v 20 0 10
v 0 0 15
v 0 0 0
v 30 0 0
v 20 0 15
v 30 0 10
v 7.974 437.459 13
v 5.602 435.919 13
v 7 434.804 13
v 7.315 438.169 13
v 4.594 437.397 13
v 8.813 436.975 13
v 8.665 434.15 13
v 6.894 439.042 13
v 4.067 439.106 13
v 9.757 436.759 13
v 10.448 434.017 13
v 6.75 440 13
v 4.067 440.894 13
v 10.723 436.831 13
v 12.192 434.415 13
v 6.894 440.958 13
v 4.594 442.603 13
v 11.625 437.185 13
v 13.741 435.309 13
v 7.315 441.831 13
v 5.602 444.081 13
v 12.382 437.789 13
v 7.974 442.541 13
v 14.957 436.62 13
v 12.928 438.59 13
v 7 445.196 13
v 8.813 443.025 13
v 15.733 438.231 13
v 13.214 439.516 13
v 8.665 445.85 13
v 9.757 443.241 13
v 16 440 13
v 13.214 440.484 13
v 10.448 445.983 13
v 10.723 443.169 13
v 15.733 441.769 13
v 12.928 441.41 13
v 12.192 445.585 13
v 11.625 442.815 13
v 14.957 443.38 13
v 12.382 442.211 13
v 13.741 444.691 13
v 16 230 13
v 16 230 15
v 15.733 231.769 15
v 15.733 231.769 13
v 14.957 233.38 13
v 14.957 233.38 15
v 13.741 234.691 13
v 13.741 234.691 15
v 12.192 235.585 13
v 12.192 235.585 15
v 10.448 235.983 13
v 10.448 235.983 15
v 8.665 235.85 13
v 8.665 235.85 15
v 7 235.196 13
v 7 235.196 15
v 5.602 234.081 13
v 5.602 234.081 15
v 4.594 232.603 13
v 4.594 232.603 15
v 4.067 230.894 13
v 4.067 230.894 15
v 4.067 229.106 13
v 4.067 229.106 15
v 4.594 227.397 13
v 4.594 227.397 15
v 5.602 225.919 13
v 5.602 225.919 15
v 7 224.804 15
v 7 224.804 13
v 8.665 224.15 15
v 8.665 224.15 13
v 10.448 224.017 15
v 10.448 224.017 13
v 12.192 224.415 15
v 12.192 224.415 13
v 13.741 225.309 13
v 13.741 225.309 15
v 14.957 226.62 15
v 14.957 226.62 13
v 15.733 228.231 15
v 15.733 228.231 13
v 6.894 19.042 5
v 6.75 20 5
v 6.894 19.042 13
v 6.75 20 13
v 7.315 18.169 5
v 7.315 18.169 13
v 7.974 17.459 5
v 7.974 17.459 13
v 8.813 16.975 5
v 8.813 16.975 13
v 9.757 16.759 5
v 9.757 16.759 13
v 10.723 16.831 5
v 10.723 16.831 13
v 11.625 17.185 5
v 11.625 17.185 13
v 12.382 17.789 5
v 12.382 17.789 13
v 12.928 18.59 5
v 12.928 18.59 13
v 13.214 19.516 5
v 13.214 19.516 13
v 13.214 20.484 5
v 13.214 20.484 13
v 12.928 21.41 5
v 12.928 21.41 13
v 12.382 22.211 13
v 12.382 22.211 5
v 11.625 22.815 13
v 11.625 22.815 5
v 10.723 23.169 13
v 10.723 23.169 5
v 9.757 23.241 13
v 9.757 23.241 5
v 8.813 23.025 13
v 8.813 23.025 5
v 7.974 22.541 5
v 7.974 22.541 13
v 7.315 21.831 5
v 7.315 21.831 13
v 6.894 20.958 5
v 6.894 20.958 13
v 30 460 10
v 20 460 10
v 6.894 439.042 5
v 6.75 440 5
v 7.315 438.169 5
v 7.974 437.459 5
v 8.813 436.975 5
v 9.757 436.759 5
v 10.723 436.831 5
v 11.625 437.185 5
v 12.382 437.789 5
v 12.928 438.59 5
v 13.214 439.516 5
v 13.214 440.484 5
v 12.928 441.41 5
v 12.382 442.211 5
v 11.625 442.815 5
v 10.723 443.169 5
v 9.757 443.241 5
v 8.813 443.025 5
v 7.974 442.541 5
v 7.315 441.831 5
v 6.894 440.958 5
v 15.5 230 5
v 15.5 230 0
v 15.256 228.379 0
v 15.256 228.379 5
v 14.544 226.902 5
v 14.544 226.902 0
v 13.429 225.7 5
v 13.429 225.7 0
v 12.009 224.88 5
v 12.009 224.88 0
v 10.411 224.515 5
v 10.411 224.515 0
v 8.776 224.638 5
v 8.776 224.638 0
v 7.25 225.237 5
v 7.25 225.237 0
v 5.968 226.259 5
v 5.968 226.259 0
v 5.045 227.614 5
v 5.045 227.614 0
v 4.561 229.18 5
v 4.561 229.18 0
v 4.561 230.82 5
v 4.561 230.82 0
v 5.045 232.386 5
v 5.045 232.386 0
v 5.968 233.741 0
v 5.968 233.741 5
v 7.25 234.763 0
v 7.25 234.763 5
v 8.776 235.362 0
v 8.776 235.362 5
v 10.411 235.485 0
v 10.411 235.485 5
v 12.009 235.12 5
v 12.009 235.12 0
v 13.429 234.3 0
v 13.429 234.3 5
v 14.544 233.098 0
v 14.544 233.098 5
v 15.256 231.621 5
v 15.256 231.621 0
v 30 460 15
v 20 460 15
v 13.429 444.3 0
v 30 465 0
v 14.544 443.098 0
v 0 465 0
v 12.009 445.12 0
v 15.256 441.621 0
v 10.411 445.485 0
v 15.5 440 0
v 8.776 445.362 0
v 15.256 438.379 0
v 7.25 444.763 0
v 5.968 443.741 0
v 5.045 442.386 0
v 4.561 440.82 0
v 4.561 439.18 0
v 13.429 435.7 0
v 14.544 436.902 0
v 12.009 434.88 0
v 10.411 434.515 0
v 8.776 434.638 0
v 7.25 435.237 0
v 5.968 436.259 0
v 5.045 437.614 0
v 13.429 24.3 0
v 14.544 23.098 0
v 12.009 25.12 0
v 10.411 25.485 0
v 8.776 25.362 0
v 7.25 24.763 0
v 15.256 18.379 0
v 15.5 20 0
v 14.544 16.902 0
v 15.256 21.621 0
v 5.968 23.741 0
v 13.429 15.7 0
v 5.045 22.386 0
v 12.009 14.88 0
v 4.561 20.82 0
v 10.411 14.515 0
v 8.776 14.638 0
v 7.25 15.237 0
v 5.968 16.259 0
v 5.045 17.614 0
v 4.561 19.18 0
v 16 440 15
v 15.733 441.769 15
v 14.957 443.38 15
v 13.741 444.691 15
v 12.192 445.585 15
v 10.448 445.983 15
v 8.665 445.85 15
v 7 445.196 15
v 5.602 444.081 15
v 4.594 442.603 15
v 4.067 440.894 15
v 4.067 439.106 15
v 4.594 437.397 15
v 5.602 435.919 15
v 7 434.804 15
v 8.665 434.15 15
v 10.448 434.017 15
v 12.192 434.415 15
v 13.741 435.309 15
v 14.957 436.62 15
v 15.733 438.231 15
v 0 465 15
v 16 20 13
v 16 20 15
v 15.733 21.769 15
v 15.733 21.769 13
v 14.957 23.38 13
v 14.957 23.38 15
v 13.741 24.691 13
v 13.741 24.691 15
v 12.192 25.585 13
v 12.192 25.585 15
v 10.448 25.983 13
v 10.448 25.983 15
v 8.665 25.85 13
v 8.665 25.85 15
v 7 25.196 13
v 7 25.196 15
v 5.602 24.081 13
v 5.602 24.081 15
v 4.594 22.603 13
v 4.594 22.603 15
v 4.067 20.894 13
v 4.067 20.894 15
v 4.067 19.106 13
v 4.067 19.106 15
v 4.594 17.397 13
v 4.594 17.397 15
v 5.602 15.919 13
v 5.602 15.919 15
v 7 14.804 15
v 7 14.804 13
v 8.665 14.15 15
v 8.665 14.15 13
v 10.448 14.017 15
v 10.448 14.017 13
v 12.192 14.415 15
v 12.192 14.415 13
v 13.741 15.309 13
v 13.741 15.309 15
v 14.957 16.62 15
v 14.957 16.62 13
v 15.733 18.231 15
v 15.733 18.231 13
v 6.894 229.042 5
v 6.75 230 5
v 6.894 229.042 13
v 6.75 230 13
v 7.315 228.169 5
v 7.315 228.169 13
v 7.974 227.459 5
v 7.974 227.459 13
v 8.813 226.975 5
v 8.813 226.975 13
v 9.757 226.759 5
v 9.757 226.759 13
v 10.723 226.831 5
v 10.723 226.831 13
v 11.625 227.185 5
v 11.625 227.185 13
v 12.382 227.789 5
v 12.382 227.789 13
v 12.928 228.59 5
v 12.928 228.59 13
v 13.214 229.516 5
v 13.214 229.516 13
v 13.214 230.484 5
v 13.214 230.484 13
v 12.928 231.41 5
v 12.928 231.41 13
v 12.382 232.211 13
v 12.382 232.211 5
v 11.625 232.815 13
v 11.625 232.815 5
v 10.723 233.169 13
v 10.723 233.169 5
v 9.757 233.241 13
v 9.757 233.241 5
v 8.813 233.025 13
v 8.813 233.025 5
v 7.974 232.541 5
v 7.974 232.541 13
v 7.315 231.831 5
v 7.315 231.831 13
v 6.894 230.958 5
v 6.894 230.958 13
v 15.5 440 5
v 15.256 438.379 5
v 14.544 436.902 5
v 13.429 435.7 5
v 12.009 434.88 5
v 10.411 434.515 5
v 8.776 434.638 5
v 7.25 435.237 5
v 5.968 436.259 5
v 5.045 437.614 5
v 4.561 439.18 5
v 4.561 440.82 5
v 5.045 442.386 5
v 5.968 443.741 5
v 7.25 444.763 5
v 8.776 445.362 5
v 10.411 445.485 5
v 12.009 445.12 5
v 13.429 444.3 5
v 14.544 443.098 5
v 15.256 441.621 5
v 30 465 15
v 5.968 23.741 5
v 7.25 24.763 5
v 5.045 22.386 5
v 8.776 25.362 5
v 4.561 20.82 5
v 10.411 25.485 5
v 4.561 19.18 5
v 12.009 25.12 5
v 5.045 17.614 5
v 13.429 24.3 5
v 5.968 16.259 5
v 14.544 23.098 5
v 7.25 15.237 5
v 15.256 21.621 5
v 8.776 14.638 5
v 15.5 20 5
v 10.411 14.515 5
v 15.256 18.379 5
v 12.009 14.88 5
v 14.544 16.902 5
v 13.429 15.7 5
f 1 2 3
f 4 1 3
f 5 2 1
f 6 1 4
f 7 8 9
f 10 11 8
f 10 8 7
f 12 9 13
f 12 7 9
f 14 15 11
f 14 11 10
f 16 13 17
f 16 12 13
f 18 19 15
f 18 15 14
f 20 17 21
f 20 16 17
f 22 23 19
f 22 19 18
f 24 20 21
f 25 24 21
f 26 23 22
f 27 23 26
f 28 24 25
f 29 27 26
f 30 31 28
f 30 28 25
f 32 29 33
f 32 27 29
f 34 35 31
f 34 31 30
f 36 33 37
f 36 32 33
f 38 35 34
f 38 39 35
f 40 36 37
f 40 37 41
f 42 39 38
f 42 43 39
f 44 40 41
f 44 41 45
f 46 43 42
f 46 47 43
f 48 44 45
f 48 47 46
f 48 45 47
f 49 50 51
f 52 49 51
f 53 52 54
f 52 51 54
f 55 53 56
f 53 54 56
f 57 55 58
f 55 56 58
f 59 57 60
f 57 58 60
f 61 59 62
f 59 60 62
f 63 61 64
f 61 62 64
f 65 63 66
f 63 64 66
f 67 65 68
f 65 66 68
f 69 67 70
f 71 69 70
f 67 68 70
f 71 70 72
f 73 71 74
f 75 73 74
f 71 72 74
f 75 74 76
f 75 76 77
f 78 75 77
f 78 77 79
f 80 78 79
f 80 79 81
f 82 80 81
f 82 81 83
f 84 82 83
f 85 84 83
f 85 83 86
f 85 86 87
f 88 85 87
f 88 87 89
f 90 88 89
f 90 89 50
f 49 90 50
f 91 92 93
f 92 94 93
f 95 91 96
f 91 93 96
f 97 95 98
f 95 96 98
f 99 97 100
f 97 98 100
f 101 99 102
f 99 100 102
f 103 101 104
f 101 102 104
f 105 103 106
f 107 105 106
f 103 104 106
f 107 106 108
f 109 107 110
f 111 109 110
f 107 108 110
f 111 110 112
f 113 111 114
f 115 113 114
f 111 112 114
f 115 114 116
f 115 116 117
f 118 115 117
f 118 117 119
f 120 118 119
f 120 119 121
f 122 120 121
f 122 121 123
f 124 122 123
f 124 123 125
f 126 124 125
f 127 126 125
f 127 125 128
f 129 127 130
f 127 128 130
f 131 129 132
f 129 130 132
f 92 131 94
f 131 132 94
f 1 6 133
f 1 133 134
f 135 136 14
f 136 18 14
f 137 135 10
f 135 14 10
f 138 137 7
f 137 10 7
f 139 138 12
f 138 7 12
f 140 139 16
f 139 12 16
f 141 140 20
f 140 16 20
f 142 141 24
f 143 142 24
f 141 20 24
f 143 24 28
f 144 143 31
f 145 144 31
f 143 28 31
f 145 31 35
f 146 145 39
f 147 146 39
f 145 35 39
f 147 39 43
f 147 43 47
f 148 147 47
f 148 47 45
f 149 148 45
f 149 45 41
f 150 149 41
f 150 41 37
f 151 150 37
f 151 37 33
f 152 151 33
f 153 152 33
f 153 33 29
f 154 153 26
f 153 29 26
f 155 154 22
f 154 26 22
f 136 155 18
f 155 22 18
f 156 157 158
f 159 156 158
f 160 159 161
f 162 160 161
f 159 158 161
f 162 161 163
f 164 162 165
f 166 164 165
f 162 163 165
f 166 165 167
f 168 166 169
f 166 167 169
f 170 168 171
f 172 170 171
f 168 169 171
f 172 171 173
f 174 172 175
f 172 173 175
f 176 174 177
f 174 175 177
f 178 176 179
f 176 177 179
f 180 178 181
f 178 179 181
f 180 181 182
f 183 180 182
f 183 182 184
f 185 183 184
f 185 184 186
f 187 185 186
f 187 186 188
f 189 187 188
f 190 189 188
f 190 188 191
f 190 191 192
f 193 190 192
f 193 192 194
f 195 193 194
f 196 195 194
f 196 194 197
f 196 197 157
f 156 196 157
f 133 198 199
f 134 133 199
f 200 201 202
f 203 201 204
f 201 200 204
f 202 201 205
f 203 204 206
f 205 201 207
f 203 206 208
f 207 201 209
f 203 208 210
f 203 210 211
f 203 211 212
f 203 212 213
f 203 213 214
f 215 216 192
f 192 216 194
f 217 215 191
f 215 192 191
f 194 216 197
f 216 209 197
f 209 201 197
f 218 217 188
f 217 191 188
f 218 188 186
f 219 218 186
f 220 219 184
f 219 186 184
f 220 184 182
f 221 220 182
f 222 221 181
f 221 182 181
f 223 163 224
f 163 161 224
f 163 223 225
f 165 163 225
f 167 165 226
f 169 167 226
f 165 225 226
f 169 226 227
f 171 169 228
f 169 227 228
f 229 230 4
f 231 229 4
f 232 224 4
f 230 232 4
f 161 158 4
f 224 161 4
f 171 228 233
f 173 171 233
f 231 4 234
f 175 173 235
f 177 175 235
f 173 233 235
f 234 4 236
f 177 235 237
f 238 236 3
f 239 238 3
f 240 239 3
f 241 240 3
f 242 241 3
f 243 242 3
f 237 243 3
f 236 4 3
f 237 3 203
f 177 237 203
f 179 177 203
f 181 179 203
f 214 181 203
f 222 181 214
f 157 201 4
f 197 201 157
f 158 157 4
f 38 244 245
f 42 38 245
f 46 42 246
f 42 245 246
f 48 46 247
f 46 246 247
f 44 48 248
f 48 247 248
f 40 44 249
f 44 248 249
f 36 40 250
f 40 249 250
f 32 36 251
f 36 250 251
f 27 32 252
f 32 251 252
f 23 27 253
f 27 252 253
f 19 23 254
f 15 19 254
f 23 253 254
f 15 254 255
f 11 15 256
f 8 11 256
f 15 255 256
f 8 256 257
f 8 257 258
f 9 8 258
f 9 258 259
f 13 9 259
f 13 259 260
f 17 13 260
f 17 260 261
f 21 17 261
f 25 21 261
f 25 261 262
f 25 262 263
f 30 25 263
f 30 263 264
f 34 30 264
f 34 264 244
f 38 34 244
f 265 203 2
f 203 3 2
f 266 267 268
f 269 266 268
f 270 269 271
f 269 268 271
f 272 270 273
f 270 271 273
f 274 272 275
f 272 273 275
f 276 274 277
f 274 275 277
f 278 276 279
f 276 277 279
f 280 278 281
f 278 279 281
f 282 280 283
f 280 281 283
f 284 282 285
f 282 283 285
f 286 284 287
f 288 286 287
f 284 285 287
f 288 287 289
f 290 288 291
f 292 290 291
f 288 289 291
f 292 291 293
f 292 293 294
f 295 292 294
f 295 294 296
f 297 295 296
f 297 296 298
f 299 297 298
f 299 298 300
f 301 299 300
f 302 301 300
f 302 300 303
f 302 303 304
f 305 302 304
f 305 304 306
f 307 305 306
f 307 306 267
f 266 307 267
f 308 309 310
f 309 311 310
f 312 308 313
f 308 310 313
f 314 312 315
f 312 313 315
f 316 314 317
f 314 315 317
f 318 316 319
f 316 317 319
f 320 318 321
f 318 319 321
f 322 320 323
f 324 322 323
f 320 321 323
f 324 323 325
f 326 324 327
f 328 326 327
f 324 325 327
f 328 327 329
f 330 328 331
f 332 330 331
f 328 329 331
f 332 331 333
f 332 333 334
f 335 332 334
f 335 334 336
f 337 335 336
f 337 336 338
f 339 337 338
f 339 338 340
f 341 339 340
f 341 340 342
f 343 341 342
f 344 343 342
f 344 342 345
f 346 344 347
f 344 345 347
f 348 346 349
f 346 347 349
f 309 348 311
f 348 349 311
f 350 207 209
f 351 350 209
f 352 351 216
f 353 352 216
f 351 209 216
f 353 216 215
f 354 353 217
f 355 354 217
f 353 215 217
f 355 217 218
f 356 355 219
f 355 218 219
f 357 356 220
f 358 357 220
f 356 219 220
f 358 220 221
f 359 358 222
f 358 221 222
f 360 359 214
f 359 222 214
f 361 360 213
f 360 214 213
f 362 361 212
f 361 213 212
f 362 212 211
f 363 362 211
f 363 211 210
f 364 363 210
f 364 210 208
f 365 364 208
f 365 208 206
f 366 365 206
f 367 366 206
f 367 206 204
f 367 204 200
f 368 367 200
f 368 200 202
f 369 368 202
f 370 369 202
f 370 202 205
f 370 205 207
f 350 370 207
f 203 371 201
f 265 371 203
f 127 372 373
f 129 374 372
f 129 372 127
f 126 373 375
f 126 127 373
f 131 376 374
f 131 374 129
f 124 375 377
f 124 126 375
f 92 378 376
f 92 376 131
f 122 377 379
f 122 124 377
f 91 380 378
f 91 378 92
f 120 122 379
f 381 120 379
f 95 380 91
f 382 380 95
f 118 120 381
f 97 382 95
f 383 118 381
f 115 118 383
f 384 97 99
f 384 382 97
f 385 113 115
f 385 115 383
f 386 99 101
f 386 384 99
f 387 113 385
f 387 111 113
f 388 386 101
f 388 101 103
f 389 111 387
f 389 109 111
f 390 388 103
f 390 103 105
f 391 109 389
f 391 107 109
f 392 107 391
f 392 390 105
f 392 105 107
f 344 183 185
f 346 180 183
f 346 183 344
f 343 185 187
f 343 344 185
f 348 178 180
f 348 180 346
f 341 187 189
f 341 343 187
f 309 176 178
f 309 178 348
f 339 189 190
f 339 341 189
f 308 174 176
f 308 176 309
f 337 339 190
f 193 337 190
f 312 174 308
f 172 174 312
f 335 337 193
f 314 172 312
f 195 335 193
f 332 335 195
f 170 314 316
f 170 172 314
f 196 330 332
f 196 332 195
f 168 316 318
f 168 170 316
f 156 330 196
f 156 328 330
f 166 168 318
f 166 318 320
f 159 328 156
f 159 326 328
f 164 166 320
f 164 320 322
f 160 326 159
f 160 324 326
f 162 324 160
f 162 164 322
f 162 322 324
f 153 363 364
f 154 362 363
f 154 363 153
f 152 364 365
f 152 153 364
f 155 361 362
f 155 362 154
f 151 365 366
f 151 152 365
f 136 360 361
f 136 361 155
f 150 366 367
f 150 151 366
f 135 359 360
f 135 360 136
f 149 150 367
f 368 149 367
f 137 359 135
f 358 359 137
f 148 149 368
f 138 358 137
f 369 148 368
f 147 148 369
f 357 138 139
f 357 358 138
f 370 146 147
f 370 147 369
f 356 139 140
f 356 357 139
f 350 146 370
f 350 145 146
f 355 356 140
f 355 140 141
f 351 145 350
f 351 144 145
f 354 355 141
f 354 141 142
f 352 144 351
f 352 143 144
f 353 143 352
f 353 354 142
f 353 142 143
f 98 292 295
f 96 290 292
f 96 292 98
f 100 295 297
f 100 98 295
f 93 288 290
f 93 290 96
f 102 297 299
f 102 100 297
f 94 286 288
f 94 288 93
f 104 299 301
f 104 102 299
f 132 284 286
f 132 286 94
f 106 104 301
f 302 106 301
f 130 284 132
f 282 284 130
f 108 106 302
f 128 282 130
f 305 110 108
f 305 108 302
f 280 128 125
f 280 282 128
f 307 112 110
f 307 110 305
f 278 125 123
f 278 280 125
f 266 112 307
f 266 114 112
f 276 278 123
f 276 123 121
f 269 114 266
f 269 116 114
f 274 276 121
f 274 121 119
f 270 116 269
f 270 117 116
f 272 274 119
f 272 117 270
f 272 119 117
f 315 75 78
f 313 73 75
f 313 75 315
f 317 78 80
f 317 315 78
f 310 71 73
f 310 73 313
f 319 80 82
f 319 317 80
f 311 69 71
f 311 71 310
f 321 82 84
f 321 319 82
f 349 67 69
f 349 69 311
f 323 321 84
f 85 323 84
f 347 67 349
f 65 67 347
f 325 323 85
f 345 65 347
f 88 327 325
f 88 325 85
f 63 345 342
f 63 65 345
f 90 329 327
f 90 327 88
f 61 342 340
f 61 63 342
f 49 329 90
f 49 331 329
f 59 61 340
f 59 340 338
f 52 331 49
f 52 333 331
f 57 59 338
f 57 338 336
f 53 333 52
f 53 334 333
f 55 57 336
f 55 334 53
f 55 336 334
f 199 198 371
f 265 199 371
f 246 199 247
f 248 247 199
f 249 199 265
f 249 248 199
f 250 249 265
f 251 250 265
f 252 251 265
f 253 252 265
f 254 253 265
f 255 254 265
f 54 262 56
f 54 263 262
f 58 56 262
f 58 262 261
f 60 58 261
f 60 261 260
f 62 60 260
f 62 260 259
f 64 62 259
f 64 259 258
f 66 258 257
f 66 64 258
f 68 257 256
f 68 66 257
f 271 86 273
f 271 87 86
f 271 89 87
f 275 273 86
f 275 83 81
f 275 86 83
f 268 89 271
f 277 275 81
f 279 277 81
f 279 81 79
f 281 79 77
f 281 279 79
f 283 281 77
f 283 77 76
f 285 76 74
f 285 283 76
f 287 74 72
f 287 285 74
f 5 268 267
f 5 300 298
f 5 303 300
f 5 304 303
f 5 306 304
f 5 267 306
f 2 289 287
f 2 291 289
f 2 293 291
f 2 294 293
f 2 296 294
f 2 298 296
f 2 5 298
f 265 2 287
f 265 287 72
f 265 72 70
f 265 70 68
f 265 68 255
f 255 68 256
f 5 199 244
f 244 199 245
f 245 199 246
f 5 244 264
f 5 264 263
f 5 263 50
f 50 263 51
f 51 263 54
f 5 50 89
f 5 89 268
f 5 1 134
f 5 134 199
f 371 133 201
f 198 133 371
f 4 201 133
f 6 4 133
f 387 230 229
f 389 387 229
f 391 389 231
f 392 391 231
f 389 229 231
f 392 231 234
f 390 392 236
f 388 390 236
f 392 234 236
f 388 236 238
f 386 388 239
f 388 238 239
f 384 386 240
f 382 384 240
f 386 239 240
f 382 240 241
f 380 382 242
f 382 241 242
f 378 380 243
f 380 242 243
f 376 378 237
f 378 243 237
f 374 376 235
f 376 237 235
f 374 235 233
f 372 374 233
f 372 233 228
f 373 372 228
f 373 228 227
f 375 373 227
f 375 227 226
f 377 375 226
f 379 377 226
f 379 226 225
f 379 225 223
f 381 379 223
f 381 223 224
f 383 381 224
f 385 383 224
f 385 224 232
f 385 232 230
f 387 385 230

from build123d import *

# Parameters (mm, degrees)
F1_DEPTH       = 460
F3_D           = 6.5
F3_DEPTH       = 15
F3_CBORE_D     = 11
F3_CBORE_DEPTH = 5
F5_D           = 6.5
F5_DEPTH       = 15
F5_CBORE_D     = 12
F5_CBORE_DEPTH = 2
F6_W           = 30
F6_H           = 15
F7_DEPTH       = 5


with BuildPart() as f1:
    # F0 (on Front) → F1 (new body)
    with BuildSketch(Plane.XZ):
        Polygon((0, 15), (0, 0), (30, 0), (30, 10), (20, 10), (20, 15), align=None)
    extrude(amount=-F1_DEPTH)

    # F3
    with Locations(Plane(origin=(0, 0, 0), x_dir=(1, 0, 0), z_dir=(0, 0, -1))):
        with Locations((10, -440), (10, -230), (10, -20)):
            CounterBoreHole(F3_D / 2, F3_CBORE_D / 2, F3_CBORE_DEPTH, depth=F3_DEPTH)

    # F5
    with Locations(Plane.XY.offset(15)):
        with Locations((10, 440), (10, 230), (10, 20)):
            CounterBoreHole(F5_D / 2, F5_CBORE_D / 2, F5_CBORE_DEPTH, depth=F5_DEPTH)

    # F6 (on face) → F7 (join)
    with BuildSketch(Plane(origin=(0, 460, 0), x_dir=(-1, 0, 0), z_dir=(0, 1, 0))):
        with Locations((-15, 7.5)):
            Rectangle(F6_W, F6_H)
    extrude(amount=F7_DEPTH)


solid = f1.part
